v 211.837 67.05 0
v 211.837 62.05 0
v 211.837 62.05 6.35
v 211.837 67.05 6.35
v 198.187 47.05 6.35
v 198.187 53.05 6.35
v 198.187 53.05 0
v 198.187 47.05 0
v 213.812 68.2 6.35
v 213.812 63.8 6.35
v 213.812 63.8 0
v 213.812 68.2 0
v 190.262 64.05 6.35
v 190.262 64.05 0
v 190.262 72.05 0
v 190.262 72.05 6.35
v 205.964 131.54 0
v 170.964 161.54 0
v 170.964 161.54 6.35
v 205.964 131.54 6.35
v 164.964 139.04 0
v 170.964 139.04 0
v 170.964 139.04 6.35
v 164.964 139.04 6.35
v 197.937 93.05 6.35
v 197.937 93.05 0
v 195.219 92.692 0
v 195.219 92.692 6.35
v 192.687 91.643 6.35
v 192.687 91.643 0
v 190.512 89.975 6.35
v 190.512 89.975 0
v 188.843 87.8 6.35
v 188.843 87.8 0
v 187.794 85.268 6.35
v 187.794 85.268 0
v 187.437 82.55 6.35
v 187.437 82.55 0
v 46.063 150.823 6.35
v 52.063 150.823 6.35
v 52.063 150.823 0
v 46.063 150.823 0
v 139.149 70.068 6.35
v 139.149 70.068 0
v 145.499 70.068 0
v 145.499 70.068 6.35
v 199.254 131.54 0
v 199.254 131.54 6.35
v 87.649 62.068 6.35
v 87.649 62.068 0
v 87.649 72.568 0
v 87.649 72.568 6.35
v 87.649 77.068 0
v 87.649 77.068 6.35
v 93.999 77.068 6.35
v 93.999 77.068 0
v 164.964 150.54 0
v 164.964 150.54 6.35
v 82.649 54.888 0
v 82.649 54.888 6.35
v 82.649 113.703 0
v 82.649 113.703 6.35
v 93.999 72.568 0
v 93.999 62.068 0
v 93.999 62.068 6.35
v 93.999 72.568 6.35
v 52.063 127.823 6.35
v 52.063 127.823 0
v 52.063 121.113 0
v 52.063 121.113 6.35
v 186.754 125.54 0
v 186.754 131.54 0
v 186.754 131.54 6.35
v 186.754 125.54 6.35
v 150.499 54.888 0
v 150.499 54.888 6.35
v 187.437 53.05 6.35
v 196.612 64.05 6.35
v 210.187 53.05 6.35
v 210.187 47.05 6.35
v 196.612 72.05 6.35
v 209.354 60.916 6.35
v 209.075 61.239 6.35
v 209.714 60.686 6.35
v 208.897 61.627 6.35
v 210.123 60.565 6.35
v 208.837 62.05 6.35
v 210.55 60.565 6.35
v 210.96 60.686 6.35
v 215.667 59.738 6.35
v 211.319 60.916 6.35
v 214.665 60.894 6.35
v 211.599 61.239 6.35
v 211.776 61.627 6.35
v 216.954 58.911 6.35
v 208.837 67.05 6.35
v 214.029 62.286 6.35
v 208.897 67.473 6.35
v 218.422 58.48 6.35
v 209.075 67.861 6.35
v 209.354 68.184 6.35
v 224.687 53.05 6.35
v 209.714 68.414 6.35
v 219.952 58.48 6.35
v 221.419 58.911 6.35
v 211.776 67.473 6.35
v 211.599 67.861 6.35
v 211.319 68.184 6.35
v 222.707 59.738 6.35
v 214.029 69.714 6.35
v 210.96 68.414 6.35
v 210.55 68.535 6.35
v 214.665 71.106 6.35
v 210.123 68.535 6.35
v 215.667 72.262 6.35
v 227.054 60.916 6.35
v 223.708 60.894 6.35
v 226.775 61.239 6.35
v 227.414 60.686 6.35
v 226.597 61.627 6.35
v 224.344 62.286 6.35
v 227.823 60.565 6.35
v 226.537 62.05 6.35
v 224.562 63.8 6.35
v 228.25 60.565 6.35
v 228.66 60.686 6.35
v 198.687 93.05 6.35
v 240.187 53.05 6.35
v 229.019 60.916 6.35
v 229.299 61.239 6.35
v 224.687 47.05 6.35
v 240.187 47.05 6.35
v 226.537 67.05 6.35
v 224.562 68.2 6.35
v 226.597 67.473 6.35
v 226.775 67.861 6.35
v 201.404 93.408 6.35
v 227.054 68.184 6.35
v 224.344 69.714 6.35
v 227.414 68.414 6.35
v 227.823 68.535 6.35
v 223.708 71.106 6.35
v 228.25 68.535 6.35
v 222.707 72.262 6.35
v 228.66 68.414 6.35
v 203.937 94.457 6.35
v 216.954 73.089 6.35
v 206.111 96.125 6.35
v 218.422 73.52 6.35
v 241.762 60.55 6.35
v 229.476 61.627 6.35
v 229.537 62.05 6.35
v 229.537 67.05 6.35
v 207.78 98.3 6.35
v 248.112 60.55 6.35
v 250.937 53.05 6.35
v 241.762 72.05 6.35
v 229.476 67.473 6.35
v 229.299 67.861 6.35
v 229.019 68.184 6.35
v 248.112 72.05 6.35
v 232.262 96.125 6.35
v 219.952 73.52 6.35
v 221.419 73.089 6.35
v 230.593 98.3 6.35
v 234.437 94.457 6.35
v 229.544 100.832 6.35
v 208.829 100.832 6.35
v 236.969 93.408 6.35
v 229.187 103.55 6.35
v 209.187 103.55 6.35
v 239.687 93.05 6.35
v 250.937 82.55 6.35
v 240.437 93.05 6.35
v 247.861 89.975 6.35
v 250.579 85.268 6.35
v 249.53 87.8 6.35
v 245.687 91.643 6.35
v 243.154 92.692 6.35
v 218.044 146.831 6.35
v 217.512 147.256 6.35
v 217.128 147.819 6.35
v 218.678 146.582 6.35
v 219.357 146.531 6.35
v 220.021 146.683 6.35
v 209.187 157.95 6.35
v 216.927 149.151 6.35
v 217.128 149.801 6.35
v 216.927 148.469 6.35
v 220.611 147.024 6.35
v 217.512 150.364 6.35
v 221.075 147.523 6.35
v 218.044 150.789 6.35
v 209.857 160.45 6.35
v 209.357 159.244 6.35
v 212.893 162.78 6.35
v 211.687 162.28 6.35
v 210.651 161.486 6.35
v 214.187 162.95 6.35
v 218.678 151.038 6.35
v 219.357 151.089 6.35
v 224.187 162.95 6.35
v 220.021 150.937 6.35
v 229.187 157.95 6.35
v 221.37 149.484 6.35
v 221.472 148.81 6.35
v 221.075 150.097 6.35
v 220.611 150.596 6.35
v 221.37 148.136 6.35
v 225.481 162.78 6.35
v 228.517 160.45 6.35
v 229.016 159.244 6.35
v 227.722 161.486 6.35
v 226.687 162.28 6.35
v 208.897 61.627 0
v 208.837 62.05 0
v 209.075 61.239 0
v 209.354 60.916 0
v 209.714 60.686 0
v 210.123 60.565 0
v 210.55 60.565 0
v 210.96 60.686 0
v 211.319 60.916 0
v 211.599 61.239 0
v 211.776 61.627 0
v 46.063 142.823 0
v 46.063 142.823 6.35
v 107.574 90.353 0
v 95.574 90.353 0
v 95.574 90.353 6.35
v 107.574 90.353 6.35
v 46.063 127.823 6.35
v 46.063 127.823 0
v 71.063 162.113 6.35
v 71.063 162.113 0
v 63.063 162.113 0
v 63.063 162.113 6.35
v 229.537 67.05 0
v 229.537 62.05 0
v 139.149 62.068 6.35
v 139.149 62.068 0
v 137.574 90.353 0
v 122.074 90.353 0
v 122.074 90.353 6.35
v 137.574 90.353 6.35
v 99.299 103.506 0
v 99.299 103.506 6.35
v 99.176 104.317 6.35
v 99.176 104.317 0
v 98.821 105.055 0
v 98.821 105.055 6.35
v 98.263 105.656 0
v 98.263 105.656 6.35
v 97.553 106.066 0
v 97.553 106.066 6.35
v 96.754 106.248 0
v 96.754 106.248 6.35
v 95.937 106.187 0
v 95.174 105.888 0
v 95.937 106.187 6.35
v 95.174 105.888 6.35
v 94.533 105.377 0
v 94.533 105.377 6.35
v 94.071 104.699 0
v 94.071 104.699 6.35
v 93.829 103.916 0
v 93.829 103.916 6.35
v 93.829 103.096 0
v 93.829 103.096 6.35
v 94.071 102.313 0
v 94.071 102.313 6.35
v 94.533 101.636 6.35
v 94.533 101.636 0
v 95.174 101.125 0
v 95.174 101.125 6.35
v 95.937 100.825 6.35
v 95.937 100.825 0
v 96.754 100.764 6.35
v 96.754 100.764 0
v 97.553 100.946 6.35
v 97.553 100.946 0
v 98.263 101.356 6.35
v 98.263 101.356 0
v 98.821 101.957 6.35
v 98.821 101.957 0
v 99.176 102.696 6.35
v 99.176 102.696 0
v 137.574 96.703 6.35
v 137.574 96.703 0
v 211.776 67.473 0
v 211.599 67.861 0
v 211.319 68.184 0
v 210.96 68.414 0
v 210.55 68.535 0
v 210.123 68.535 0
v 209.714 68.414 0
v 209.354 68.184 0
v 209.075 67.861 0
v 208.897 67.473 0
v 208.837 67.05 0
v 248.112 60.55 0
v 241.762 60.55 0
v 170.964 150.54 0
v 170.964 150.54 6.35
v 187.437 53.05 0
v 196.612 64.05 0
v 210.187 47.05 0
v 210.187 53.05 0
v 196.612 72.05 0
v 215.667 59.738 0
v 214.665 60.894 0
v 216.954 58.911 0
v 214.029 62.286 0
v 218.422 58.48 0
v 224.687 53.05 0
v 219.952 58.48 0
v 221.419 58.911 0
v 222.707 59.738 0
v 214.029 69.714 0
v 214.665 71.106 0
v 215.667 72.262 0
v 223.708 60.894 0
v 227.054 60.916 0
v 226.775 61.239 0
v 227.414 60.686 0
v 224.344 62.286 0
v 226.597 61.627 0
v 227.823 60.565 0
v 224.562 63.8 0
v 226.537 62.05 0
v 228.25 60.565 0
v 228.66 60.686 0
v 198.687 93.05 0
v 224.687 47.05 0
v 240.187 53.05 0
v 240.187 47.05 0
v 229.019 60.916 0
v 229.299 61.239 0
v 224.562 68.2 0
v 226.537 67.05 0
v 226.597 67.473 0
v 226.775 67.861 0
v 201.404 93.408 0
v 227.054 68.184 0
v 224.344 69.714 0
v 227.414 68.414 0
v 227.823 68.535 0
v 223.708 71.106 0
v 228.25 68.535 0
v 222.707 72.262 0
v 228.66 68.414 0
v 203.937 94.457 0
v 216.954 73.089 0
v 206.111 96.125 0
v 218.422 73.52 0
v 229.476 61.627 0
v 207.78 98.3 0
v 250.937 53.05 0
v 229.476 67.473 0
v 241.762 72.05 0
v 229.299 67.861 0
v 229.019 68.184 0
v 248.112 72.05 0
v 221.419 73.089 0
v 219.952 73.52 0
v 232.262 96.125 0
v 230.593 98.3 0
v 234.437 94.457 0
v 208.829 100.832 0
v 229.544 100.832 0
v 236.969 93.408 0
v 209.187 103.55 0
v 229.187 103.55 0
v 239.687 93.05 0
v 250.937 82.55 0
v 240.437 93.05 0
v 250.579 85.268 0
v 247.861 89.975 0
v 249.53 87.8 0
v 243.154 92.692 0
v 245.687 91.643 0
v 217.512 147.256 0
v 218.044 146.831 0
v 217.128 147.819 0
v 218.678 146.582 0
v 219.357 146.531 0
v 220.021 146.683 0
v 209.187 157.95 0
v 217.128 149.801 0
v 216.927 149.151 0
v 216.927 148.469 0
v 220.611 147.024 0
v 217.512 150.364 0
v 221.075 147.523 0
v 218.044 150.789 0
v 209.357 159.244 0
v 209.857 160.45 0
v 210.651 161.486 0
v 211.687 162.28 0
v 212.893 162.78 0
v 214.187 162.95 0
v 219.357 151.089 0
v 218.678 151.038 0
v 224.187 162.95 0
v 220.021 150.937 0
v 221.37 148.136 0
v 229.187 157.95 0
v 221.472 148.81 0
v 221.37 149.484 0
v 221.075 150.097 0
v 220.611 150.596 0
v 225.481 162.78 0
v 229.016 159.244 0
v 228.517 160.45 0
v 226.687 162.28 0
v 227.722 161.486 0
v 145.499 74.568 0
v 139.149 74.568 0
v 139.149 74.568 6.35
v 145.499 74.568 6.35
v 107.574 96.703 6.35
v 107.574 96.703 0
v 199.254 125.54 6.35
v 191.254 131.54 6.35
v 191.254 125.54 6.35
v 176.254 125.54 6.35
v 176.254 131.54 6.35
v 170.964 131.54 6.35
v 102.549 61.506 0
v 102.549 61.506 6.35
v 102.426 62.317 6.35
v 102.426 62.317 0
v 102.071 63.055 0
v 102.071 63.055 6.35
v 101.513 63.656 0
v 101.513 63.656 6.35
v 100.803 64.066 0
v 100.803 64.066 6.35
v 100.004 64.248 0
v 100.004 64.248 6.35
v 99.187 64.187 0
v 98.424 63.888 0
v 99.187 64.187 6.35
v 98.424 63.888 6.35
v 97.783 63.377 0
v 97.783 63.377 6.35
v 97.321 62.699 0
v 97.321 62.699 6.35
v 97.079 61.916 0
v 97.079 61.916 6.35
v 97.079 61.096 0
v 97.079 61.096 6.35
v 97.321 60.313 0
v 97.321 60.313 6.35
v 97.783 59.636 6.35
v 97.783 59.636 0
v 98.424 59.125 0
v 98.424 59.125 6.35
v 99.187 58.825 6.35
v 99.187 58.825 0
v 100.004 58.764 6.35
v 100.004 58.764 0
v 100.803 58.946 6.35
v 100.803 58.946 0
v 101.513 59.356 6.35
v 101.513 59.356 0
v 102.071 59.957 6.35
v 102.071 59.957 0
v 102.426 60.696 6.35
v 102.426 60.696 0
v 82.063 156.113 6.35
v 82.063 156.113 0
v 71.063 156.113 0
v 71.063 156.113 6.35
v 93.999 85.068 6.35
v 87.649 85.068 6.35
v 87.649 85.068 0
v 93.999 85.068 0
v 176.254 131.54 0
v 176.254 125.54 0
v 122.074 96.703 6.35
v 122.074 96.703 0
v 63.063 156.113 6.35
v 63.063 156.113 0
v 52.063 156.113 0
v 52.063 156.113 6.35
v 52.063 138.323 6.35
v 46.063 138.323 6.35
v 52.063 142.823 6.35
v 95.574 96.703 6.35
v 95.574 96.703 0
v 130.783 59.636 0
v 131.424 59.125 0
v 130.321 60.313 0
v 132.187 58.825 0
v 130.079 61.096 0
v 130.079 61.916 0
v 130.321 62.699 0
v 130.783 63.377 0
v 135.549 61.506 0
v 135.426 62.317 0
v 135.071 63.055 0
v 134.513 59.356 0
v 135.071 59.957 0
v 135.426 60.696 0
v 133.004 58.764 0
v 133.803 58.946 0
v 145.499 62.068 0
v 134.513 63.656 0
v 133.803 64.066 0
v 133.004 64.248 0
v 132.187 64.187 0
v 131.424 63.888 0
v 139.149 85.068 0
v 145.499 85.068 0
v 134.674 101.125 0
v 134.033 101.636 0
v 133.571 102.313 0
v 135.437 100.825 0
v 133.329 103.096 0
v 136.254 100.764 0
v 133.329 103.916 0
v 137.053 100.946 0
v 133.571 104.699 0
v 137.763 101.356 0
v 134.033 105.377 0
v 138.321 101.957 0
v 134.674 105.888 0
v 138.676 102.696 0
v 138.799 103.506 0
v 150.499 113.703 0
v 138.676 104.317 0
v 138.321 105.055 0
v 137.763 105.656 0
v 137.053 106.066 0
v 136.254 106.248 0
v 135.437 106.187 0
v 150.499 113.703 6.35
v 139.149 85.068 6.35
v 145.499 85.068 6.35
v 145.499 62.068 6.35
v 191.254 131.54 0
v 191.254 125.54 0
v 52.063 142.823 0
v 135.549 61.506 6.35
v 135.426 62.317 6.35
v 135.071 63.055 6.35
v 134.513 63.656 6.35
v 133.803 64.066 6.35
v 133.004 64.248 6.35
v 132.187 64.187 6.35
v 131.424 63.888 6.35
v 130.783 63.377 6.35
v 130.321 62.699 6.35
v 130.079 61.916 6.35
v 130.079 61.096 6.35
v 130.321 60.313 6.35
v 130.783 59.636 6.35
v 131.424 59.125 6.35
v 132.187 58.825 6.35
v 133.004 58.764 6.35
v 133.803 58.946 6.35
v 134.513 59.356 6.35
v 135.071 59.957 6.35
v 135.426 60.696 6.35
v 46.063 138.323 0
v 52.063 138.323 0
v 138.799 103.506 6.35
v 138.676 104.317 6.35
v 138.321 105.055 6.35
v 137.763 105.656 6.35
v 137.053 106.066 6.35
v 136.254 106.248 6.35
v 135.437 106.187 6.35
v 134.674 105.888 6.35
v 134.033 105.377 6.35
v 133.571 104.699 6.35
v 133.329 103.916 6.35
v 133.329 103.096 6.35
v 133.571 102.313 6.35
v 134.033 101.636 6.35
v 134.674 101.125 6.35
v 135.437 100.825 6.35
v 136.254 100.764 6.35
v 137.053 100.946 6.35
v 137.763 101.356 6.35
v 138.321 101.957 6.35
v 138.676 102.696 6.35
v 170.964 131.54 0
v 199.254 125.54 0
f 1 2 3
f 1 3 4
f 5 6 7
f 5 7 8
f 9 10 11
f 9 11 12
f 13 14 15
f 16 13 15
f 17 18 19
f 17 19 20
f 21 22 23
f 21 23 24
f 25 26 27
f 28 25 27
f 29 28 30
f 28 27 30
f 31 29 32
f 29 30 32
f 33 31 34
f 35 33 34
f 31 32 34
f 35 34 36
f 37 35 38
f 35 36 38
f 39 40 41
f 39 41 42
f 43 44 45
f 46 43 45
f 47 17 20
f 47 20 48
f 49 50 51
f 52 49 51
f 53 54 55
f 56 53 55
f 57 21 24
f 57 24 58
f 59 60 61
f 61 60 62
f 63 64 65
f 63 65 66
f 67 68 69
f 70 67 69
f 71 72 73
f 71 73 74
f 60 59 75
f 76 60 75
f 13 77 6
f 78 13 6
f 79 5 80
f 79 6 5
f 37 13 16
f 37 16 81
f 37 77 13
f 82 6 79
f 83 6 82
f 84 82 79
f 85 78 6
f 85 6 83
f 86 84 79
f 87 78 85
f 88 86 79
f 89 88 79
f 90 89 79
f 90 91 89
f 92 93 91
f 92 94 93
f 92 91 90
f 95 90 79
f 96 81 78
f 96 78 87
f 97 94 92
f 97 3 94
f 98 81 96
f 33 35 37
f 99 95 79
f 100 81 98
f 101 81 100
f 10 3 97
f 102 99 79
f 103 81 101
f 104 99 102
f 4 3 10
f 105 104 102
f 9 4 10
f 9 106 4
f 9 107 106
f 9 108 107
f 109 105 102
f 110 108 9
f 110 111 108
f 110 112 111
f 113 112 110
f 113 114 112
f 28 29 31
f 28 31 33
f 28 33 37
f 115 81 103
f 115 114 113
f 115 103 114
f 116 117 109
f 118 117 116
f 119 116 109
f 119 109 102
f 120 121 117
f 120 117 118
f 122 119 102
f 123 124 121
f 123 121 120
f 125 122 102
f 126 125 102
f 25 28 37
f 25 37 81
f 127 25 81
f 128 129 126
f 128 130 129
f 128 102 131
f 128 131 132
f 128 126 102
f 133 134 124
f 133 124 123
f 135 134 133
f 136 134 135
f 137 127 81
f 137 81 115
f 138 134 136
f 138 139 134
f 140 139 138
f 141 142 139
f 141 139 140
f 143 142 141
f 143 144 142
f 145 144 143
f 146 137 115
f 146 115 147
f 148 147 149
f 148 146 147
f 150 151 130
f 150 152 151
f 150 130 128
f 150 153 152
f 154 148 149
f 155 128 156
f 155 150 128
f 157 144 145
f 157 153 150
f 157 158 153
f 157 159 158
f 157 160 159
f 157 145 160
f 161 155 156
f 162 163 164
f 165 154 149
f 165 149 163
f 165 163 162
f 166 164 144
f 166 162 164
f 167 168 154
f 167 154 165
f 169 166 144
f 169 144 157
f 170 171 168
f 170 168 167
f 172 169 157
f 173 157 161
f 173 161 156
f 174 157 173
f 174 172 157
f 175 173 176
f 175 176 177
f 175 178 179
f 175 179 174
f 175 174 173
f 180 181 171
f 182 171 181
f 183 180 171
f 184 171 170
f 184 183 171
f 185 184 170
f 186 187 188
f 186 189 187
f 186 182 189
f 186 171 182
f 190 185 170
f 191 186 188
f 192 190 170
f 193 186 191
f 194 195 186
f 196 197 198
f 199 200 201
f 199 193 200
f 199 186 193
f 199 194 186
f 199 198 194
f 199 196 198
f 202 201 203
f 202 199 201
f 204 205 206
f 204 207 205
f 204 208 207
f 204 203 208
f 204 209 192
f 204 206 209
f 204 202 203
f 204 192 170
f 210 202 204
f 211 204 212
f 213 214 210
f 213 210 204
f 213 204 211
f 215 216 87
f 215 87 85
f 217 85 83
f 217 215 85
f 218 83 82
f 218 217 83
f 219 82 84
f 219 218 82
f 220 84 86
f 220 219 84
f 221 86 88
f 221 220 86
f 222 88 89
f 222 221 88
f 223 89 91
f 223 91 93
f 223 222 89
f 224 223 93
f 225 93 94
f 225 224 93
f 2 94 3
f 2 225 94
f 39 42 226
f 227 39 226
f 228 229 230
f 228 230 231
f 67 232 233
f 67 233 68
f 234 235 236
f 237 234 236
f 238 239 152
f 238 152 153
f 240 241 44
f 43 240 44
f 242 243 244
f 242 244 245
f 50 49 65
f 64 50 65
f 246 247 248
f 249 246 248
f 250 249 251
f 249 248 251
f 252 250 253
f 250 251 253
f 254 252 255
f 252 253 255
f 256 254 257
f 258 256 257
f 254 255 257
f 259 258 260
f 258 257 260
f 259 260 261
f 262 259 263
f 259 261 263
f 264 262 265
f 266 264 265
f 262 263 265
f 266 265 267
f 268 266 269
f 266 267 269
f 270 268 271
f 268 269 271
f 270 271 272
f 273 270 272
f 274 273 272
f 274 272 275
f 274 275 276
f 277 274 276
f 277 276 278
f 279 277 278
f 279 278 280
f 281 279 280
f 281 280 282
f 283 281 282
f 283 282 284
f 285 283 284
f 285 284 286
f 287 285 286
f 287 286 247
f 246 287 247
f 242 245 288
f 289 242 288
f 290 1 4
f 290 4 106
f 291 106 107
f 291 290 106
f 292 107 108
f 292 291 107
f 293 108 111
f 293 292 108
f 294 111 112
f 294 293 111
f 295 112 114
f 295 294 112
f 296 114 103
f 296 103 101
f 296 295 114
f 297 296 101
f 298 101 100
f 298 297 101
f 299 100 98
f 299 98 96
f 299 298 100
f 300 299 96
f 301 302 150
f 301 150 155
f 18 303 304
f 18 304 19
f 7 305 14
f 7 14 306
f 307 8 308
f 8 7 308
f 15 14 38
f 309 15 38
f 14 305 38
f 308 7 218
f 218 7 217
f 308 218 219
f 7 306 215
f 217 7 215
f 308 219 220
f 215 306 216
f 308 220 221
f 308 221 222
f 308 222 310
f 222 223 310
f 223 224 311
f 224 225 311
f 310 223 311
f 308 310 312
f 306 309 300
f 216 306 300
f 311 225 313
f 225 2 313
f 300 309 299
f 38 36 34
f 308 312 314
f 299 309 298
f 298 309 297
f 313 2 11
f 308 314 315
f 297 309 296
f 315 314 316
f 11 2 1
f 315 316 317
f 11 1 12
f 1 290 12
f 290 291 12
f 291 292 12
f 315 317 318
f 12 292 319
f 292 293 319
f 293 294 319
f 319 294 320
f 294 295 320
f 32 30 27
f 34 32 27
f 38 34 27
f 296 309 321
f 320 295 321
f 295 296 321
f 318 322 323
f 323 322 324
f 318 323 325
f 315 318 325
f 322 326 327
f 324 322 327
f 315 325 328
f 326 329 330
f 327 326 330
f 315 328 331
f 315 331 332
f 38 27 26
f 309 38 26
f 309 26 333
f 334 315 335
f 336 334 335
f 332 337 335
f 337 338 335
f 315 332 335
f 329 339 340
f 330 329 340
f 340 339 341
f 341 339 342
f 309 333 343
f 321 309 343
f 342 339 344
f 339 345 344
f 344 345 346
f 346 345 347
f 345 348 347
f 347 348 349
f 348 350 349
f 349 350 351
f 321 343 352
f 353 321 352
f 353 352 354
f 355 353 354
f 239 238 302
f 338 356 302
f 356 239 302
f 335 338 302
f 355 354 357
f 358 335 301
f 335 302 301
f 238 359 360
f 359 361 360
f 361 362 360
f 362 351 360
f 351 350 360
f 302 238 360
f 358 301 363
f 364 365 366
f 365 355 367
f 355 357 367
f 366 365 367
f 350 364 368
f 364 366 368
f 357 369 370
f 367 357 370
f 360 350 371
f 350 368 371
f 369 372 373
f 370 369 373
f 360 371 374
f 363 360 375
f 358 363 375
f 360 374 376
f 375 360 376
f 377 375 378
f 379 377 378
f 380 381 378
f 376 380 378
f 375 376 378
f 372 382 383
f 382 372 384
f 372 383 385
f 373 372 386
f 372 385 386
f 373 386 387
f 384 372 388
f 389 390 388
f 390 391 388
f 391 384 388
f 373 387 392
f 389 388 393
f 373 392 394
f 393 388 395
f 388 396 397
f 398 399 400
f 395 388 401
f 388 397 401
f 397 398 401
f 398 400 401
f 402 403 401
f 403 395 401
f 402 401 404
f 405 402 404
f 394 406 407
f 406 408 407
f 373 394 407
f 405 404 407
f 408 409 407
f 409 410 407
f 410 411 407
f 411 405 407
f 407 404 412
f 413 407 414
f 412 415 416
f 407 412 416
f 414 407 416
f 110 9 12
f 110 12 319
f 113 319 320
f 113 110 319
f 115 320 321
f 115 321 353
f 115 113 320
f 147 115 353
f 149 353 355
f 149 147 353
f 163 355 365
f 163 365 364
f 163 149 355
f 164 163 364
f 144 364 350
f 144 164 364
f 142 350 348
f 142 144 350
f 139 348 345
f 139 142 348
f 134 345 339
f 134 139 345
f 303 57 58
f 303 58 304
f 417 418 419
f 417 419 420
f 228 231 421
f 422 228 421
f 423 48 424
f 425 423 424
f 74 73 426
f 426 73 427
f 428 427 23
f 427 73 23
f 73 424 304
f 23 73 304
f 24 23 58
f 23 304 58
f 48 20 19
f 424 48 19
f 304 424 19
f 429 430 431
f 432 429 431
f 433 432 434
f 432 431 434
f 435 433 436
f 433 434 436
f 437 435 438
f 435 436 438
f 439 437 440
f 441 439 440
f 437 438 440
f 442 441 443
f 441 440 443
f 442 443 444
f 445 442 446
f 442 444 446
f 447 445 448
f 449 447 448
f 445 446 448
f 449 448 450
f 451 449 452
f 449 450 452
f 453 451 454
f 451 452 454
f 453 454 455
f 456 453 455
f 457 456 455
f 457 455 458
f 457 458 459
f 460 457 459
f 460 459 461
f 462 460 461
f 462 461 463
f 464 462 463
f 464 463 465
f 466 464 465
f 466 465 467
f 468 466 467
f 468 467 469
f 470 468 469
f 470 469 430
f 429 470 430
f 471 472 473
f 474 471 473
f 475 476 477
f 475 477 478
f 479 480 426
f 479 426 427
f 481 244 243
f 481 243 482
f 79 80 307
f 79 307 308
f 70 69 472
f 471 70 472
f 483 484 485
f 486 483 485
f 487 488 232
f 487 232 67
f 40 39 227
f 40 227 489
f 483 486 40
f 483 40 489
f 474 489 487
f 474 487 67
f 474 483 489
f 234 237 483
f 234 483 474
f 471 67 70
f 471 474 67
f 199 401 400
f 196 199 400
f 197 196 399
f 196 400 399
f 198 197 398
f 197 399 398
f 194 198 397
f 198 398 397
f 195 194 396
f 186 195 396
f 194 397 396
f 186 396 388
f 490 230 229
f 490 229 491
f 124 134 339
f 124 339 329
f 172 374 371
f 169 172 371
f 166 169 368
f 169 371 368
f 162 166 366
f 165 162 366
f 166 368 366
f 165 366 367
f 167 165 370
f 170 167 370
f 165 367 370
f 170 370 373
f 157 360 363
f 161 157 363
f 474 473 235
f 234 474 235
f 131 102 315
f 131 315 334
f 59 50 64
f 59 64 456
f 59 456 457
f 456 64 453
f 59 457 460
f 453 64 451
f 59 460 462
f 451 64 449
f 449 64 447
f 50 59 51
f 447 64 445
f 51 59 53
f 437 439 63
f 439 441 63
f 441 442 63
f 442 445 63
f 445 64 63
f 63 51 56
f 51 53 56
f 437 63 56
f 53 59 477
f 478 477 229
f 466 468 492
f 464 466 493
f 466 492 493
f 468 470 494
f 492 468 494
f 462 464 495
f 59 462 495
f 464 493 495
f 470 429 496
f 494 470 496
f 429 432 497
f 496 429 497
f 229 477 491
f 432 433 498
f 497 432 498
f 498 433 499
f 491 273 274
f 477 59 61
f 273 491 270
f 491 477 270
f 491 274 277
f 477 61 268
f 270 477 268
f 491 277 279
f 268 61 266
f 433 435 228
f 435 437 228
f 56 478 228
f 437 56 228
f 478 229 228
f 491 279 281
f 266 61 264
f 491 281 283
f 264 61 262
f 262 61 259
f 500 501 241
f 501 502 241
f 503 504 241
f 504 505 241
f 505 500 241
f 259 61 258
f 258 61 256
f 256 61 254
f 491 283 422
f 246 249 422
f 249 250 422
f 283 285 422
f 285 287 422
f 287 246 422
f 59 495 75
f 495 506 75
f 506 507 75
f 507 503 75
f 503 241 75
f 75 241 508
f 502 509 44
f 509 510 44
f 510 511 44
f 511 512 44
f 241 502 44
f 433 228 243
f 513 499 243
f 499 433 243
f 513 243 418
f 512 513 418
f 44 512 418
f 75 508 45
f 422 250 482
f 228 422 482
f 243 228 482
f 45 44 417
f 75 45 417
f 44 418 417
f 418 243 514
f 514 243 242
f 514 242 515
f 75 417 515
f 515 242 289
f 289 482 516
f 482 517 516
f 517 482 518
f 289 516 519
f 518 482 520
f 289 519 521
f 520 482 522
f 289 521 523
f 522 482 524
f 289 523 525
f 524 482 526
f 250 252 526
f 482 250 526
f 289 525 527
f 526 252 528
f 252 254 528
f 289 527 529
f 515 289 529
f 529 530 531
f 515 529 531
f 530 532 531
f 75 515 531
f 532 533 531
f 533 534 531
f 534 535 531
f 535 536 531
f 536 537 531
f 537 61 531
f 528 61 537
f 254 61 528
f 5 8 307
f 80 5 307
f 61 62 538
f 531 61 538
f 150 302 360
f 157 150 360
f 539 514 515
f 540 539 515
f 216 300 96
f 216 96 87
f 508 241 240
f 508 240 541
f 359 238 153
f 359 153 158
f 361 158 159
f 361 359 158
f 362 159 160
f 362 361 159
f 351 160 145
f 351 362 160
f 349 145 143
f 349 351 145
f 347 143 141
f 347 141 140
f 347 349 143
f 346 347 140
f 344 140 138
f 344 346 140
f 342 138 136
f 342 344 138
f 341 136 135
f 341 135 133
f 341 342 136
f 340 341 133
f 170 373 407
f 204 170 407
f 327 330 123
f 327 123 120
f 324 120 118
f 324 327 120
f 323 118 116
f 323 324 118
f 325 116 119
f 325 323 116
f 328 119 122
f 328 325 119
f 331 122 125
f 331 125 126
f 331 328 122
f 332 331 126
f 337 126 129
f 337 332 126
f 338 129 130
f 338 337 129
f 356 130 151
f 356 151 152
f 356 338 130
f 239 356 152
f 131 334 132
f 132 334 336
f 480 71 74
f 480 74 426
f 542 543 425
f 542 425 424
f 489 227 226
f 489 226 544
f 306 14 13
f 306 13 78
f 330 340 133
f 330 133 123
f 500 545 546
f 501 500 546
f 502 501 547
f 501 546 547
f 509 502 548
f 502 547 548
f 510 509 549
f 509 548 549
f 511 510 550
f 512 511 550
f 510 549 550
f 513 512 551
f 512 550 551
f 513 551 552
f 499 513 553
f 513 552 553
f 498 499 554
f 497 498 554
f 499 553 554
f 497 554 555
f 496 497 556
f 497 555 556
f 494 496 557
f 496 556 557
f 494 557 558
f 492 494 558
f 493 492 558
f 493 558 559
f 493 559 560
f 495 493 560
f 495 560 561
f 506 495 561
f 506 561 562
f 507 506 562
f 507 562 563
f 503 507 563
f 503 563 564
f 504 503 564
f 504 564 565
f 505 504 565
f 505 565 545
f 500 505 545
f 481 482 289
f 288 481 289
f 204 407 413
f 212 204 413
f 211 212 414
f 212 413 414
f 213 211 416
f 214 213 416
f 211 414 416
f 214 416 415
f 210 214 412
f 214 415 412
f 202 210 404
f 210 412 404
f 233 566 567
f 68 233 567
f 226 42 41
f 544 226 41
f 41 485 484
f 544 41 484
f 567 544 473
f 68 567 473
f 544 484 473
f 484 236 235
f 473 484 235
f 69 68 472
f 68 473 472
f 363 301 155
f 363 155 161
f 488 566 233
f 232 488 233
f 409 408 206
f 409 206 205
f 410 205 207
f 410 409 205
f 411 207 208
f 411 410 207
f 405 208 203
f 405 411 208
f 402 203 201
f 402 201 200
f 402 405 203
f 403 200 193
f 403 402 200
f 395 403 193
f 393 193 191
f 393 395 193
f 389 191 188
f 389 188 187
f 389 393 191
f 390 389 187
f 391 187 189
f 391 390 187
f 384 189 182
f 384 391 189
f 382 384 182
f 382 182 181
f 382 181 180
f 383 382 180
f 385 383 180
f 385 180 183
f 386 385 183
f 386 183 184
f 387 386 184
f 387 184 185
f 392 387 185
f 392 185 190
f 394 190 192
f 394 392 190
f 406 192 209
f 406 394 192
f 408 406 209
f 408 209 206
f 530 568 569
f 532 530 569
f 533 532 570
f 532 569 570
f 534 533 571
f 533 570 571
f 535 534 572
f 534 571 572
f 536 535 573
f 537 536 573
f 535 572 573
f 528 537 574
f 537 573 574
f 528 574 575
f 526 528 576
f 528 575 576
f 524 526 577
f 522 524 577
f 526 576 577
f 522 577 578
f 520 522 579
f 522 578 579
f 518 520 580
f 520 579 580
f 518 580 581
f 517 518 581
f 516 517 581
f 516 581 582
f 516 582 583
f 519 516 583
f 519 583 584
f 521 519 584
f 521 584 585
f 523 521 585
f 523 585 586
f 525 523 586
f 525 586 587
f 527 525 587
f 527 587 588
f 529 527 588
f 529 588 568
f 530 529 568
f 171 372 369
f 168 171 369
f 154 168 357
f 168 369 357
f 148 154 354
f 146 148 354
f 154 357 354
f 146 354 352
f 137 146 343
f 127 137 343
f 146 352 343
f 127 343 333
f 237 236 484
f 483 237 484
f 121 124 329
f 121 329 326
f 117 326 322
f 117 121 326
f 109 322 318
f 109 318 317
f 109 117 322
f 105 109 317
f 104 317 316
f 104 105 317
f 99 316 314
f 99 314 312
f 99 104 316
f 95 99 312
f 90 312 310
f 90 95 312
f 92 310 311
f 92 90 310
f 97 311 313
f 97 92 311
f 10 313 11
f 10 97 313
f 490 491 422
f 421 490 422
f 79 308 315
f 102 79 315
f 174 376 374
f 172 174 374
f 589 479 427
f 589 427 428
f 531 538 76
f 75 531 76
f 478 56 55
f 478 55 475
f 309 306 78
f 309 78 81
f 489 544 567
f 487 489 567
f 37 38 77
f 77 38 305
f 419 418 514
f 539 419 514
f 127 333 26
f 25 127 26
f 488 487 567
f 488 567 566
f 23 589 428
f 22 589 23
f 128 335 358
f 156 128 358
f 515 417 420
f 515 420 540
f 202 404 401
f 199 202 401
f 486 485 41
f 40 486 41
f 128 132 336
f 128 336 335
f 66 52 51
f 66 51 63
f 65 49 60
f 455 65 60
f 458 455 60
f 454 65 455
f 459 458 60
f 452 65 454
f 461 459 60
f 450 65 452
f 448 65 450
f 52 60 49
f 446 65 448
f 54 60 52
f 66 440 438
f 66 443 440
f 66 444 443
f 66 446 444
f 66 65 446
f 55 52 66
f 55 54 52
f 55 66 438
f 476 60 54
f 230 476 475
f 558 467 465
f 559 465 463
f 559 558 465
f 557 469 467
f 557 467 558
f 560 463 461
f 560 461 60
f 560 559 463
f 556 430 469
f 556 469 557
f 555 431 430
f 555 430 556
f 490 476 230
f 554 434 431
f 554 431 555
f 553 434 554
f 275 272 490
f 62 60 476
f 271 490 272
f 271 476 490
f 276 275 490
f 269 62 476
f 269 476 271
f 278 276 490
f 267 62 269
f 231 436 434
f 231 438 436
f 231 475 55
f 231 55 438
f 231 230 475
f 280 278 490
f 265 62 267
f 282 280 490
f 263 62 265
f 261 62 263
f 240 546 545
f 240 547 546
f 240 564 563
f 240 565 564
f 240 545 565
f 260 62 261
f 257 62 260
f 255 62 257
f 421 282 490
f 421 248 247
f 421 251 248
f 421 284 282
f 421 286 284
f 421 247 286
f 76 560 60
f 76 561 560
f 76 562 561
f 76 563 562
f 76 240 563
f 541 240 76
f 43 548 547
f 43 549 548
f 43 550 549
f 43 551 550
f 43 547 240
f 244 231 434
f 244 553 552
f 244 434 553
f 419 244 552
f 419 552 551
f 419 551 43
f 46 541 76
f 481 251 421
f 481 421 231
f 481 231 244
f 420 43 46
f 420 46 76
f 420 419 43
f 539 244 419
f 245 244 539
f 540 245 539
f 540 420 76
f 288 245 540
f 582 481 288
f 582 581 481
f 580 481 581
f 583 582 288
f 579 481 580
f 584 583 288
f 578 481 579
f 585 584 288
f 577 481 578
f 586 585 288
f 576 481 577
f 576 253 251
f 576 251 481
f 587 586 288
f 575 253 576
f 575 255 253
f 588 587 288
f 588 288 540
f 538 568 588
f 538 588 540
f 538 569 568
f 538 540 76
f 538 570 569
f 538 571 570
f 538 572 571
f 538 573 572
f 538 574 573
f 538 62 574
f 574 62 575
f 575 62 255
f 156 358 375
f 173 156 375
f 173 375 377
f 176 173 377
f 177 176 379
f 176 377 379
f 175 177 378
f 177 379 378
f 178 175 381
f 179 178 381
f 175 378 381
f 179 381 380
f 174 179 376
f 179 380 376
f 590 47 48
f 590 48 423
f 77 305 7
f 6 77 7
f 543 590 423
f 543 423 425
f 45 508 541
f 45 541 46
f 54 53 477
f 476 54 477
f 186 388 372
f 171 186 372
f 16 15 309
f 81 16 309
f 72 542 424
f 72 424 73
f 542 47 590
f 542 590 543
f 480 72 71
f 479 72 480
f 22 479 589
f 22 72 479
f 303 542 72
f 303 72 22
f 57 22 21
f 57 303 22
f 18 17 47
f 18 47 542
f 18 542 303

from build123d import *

# Parameters (mm, degrees)
BOSS_EXTRUDE1_DEPTH   = 6.35
MODEL_R               = 2.285
MODEL_W               = 6.349999458
MODEL_H               = 11.499997586
MODEL_H_2             = 7.999997586
BOSS_EXTRUDE1_2_DEPTH = 6.35
MODEL_R_2             = 2.2
MODEL_W_2             = 6.35
MODEL_H_3             = 8
MODEL_H_4             = 10.5
MODEL_W_3             = 12
MODEL_H_5             = 6.35
MODEL_W_4             = 15.5
BOSS_EXTRUDE1_3_DEPTH = 6.35
BOSS_EXTRUDE1_4_DEPTH = 6.35
BOSS_EXTRUDE2_DEPTH   = 6.35
CUT_EXTRUDE2_DEPTH    = 10
SKETCH5_R             = 2.75
CUT_EXTRUDE3_DEPTH    = 10


with BuildPart() as part:
    # Model → Boss-Extrude1 (new body)
    with BuildSketch(Plane.XY):
        Polygon((46.063366814, 150.822944758), (46.063366814, 142.822944378), (52.063366866, 142.822944378), (52.063366866, 138.322944162), (46.063366814, 138.322944162), (46.063366814, 127.822944713), (52.063366866, 127.822944713), (52.063366866, 121.112944377), (82.063366196, 156.112944526), (71.063366255, 156.112944526), (71.063366255, 162.112944578), (63.063366807, 162.112944578), (63.063366807, 156.112944526), (52.063366866, 156.112944526), (52.063366866, 150.822944758), align=None)
    extrude(amount=BOSS_EXTRUDE1_DEPTH)


with BuildPart() as body_2:
    # Model → Boss-Extrude1 2 (new body)
    with BuildSketch(Plane.XY):
        with BuildLine():
            Line((198.186632456, 47.05000008), (210.18663256, 47.05000008))
            Line((210.18663256, 47.05000008), (210.18663256, 53.050001064))
            Line((210.18663256, 53.050001064), (224.686631785, 53.050001064))
            Line((224.686631785, 53.050001064), (224.686631785, 47.05000008))
            Line((224.686631785, 47.05000008), (240.186631889, 47.05000008))
            Line((240.186631889, 47.05000008), (240.186631889, 53.050001064))
            Line((240.186631889, 53.050001064), (250.936633186, 53.050001064))
            Line((250.936633186, 53.050001064), (250.936633186, 82.54999938))
            ThreePointArc((250.936633186, 82.54999938), (247.861254091, 89.974621076), (240.436632396, 93.05000017))
            Line((240.436632396, 93.05000017), (239.686632739, 93.05000017))
            ThreePointArc((239.686632739, 93.05000017), (232.262011141, 96.125378704), (229.186631949, 103.550000028))
            Line((229.186631949, 103.550000028), (229.186631949, 157.949999818))
            ThreePointArc((229.186631949, 157.949999818), (227.722165591, 161.485533076), (224.186632061, 162.949998775))
            Line((224.186632061, 162.949998775), (214.186632284, 162.949998775))
            ThreePointArc((214.186632284, 162.949998775), (210.651098754, 161.485533076), (209.186632396, 157.949999818))
            Line((209.186632396, 157.949999818), (209.186632396, 103.550000028))
            ThreePointArc((209.186632396, 103.550000028), (206.111253204, 96.125378704), (198.686631606, 93.05000017))
            Line((198.686631606, 93.05000017), (197.936631949, 93.05000017))
            ThreePointArc((197.936631949, 93.05000017), (190.512010254, 89.974621076), (187.436631159, 82.54999938))
            Line((187.436631159, 82.54999938), (187.436631159, 53.050001064))
            Line((187.436631159, 53.050001064), (198.186632456, 53.050001064))
            Line((198.186632456, 53.050001064), (198.186632456, 47.05000008))
        make_face()
        with Locations((219.186632172, 148.80999992)):
            Circle(MODEL_R, mode=Mode.SUBTRACT)
        with Locations((244.936632202, 66.299999797)):
            Rectangle(MODEL_W, MODEL_H, mode=Mode.SUBTRACT)
        with Locations((193.436632143, 68.049999797)):
            Rectangle(MODEL_W, MODEL_H_2, mode=Mode.SUBTRACT)
        with BuildLine():
            Line((208.836632059, 67.049999633), (208.836632059, 62.050000676))
            ThreePointArc((208.836632059, 62.050000676), (210.336632072, 60.550000663), (211.836632085, 62.050000676))
            Line((211.836632085, 62.050000676), (211.836632085, 67.049999633))
            ThreePointArc((211.836632085, 67.049999633), (210.336632072, 68.549999646), (208.836632059, 67.049999633))
        make_face(mode=Mode.SUBTRACT)
        with BuildLine():
            Line((212.811632292, 68.200000474), (212.811632292, 63.800000498))
            ThreePointArc((212.811632292, 63.800000498), (219.186632172, 57.425000617), (225.561632053, 63.800000498))
            Line((225.561632053, 63.800000498), (225.561632053, 68.200000474))
            ThreePointArc((225.561632053, 68.200000474), (219.186632172, 74.575000355), (212.811632292, 68.200000474))
        make_face(mode=Mode.SUBTRACT)
        with BuildLine():
            Line((226.53663226, 67.049999633), (226.53663226, 62.050000676))
            ThreePointArc((226.53663226, 62.050000676), (228.036632273, 60.550000663), (229.536632286, 62.050000676))
            Line((229.536632286, 62.050000676), (229.536632286, 67.049999633))
            ThreePointArc((229.536632286, 67.049999633), (228.036632273, 68.549999646), (226.53663226, 67.049999633))
        make_face(mode=Mode.SUBTRACT)
    extrude(amount=BOSS_EXTRUDE1_2_DEPTH)

    # Sketch2 → Boss-Extrude2 (add)
    with BuildSketch(Plane.XY.offset(6.35)):
        with BuildLine():
            Line((226.141476956, 68.200000474), (226.141476956, 63.800000498))
            ThreePointArc((226.141476956, 63.800000498), (219.186632172, 56.845155714), (212.231787389, 63.800000498))
            Line((212.231787389, 63.800000498), (212.231787389, 68.200000474))
            ThreePointArc((212.231787389, 68.200000474), (219.186632172, 75.154845258), (226.141476956, 68.200000474))
        make_face()
        with BuildLine():
            Line((224.561632053, 68.200000474), (224.561632053, 63.800000498))
            ThreePointArc((224.561632053, 63.800000498), (219.186632172, 58.425000617), (213.811632292, 63.800000498))
            Line((213.811632292, 63.800000498), (213.811632292, 68.200000474))
            ThreePointArc((213.811632292, 68.200000474), (219.186632172, 73.575000355), (224.561632053, 68.200000474))
        make_face(mode=Mode.SUBTRACT)
    extrude(amount=-BOSS_EXTRUDE2_DEPTH)


with BuildPart() as body_3:
    # Model → Boss-Extrude1 3 (new body)
    with BuildSketch(Plane.XY):
        with BuildLine():
            Line((63.236644346, 54.888498462), (169.911430495, 54.888498462))
            ThreePointArc((169.911430495, 54.888498462), (116.57403742, 157.038498462), (63.236644346, 54.888498462))
        make_face()
        with Locations((78.57403742, 66.138498462)):
            Circle(MODEL_R_2, mode=Mode.SUBTRACT)
        with Locations((154.57403742, 66.138498462)):
            Circle(MODEL_R_2, mode=Mode.SUBTRACT)
        with Locations((83.57403742, 117.888498462)):
            Circle(MODEL_R_2, mode=Mode.SUBTRACT)
        with Locations((149.57403742, 117.888498462)):
            Circle(MODEL_R_2, mode=Mode.SUBTRACT)
        with BuildLine():
            Line((71.600291376, 124.508498462), (71.600291376, 132.508498462))
            Line((71.600291376, 132.508498462), (83.600291376, 132.508498462))
            ThreePointArc((83.600291376, 132.508498462), (85.721611719, 131.629818805), (86.600291376, 129.508498462))
            Line((86.600291376, 129.508498462), (86.600291376, 124.508498462))
            Line((86.600291376, 124.508498462), (71.600291376, 124.508498462))
        make_face(mode=Mode.SUBTRACT)
        with Locations((90.82403742, 81.068498462)):
            Rectangle(MODEL_W_2, MODEL_H_3, mode=Mode.SUBTRACT)
        with Locations((90.82403742, 67.318498462)):
            Rectangle(MODEL_W_2, MODEL_H_4, mode=Mode.SUBTRACT)
        with Locations((101.57403742, 93.528498462)):
            Rectangle(MODEL_W_3, MODEL_H_5, mode=Mode.SUBTRACT)
        with Locations((142.32403742, 66.068498462)):
            Rectangle(MODEL_W_2, MODEL_H_3, mode=Mode.SUBTRACT)
        with Locations((142.32403742, 79.818498462)):
            Rectangle(MODEL_W_2, MODEL_H_4, mode=Mode.SUBTRACT)
        with Locations((129.82403742, 93.528498462)):
            Rectangle(MODEL_W_4, MODEL_H_5, mode=Mode.SUBTRACT)
        with BuildLine():
            Line((129.62403742, 124.258498462), (129.62403742, 131.258498462))
            ThreePointArc((129.62403742, 131.258498462), (130.209823858, 132.672712024), (131.62403742, 133.258498462))
            Line((131.62403742, 133.258498462), (140.62403742, 133.258498462))
            Line((140.62403742, 133.258498462), (140.62403742, 124.258498462))
            Line((140.62403742, 124.258498462), (129.62403742, 124.258498462))
        make_face(mode=Mode.SUBTRACT)
    extrude(amount=BOSS_EXTRUDE1_3_DEPTH)

    # Sketch4 → Cut-Extrude2 (cut)
    with BuildSketch(Plane.XY.offset(6.35)):
        Polygon((82.64903742, 54.888498462), (82.64903742, 113.703498462), (150.49903742, 113.703498462), (150.49903742, 54.888498462), (177.464223164, 45.724379929), (187.548511436, 101.148049377), (181.20637086, 118.022673409), (161.89688875, 140.774931398), (153.514477912, 163.078131664), (94.687916137, 166.82027936), (55.320522378, 121.465449289), (31.670148942, 45.724379929), align=None)
    extrude(amount=-CUT_EXTRUDE2_DEPTH, mode=Mode.SUBTRACT)

    # Sketch5 → Cut-Extrude3 (cut)
    with BuildSketch(Plane.XY.offset(6.35)):
        with Locations((99.798626622, 61.5061567)):
            Circle(SKETCH5_R)
        with Locations((132.798626622, 61.5061567)):
            Circle(SKETCH5_R)
        with Locations((96.548626622, 103.5061567)):
            Circle(SKETCH5_R)
        with Locations((136.048626622, 103.5061567)):
            Circle(SKETCH5_R)
    extrude(amount=-CUT_EXTRUDE3_DEPTH, mode=Mode.SUBTRACT)


with BuildPart() as body_4:
    # Model → Boss-Extrude1 4 (new body)
    with BuildSketch(Plane.XY):
        Polygon((164.964183141, 139.039941551), (164.964183141, 150.539941), (170.964183193, 150.539941), (170.964183193, 161.53994094), (205.964183342, 131.539941611), (199.254183006, 131.539941611), (199.254183006, 125.539941558), (191.254183557, 125.539941558), (191.254183557, 131.539941611), (186.754183341, 131.539941611), (186.754183341, 125.539941558), (176.254182961, 125.539941558), (176.254182961, 131.539941611), (170.964183193, 131.539941611), (170.964183193, 139.039941551), align=None)
    extrude(amount=BOSS_EXTRUDE1_4_DEPTH)


solid = Compound([part.part, body_2.part, body_3.part, body_4.part])
